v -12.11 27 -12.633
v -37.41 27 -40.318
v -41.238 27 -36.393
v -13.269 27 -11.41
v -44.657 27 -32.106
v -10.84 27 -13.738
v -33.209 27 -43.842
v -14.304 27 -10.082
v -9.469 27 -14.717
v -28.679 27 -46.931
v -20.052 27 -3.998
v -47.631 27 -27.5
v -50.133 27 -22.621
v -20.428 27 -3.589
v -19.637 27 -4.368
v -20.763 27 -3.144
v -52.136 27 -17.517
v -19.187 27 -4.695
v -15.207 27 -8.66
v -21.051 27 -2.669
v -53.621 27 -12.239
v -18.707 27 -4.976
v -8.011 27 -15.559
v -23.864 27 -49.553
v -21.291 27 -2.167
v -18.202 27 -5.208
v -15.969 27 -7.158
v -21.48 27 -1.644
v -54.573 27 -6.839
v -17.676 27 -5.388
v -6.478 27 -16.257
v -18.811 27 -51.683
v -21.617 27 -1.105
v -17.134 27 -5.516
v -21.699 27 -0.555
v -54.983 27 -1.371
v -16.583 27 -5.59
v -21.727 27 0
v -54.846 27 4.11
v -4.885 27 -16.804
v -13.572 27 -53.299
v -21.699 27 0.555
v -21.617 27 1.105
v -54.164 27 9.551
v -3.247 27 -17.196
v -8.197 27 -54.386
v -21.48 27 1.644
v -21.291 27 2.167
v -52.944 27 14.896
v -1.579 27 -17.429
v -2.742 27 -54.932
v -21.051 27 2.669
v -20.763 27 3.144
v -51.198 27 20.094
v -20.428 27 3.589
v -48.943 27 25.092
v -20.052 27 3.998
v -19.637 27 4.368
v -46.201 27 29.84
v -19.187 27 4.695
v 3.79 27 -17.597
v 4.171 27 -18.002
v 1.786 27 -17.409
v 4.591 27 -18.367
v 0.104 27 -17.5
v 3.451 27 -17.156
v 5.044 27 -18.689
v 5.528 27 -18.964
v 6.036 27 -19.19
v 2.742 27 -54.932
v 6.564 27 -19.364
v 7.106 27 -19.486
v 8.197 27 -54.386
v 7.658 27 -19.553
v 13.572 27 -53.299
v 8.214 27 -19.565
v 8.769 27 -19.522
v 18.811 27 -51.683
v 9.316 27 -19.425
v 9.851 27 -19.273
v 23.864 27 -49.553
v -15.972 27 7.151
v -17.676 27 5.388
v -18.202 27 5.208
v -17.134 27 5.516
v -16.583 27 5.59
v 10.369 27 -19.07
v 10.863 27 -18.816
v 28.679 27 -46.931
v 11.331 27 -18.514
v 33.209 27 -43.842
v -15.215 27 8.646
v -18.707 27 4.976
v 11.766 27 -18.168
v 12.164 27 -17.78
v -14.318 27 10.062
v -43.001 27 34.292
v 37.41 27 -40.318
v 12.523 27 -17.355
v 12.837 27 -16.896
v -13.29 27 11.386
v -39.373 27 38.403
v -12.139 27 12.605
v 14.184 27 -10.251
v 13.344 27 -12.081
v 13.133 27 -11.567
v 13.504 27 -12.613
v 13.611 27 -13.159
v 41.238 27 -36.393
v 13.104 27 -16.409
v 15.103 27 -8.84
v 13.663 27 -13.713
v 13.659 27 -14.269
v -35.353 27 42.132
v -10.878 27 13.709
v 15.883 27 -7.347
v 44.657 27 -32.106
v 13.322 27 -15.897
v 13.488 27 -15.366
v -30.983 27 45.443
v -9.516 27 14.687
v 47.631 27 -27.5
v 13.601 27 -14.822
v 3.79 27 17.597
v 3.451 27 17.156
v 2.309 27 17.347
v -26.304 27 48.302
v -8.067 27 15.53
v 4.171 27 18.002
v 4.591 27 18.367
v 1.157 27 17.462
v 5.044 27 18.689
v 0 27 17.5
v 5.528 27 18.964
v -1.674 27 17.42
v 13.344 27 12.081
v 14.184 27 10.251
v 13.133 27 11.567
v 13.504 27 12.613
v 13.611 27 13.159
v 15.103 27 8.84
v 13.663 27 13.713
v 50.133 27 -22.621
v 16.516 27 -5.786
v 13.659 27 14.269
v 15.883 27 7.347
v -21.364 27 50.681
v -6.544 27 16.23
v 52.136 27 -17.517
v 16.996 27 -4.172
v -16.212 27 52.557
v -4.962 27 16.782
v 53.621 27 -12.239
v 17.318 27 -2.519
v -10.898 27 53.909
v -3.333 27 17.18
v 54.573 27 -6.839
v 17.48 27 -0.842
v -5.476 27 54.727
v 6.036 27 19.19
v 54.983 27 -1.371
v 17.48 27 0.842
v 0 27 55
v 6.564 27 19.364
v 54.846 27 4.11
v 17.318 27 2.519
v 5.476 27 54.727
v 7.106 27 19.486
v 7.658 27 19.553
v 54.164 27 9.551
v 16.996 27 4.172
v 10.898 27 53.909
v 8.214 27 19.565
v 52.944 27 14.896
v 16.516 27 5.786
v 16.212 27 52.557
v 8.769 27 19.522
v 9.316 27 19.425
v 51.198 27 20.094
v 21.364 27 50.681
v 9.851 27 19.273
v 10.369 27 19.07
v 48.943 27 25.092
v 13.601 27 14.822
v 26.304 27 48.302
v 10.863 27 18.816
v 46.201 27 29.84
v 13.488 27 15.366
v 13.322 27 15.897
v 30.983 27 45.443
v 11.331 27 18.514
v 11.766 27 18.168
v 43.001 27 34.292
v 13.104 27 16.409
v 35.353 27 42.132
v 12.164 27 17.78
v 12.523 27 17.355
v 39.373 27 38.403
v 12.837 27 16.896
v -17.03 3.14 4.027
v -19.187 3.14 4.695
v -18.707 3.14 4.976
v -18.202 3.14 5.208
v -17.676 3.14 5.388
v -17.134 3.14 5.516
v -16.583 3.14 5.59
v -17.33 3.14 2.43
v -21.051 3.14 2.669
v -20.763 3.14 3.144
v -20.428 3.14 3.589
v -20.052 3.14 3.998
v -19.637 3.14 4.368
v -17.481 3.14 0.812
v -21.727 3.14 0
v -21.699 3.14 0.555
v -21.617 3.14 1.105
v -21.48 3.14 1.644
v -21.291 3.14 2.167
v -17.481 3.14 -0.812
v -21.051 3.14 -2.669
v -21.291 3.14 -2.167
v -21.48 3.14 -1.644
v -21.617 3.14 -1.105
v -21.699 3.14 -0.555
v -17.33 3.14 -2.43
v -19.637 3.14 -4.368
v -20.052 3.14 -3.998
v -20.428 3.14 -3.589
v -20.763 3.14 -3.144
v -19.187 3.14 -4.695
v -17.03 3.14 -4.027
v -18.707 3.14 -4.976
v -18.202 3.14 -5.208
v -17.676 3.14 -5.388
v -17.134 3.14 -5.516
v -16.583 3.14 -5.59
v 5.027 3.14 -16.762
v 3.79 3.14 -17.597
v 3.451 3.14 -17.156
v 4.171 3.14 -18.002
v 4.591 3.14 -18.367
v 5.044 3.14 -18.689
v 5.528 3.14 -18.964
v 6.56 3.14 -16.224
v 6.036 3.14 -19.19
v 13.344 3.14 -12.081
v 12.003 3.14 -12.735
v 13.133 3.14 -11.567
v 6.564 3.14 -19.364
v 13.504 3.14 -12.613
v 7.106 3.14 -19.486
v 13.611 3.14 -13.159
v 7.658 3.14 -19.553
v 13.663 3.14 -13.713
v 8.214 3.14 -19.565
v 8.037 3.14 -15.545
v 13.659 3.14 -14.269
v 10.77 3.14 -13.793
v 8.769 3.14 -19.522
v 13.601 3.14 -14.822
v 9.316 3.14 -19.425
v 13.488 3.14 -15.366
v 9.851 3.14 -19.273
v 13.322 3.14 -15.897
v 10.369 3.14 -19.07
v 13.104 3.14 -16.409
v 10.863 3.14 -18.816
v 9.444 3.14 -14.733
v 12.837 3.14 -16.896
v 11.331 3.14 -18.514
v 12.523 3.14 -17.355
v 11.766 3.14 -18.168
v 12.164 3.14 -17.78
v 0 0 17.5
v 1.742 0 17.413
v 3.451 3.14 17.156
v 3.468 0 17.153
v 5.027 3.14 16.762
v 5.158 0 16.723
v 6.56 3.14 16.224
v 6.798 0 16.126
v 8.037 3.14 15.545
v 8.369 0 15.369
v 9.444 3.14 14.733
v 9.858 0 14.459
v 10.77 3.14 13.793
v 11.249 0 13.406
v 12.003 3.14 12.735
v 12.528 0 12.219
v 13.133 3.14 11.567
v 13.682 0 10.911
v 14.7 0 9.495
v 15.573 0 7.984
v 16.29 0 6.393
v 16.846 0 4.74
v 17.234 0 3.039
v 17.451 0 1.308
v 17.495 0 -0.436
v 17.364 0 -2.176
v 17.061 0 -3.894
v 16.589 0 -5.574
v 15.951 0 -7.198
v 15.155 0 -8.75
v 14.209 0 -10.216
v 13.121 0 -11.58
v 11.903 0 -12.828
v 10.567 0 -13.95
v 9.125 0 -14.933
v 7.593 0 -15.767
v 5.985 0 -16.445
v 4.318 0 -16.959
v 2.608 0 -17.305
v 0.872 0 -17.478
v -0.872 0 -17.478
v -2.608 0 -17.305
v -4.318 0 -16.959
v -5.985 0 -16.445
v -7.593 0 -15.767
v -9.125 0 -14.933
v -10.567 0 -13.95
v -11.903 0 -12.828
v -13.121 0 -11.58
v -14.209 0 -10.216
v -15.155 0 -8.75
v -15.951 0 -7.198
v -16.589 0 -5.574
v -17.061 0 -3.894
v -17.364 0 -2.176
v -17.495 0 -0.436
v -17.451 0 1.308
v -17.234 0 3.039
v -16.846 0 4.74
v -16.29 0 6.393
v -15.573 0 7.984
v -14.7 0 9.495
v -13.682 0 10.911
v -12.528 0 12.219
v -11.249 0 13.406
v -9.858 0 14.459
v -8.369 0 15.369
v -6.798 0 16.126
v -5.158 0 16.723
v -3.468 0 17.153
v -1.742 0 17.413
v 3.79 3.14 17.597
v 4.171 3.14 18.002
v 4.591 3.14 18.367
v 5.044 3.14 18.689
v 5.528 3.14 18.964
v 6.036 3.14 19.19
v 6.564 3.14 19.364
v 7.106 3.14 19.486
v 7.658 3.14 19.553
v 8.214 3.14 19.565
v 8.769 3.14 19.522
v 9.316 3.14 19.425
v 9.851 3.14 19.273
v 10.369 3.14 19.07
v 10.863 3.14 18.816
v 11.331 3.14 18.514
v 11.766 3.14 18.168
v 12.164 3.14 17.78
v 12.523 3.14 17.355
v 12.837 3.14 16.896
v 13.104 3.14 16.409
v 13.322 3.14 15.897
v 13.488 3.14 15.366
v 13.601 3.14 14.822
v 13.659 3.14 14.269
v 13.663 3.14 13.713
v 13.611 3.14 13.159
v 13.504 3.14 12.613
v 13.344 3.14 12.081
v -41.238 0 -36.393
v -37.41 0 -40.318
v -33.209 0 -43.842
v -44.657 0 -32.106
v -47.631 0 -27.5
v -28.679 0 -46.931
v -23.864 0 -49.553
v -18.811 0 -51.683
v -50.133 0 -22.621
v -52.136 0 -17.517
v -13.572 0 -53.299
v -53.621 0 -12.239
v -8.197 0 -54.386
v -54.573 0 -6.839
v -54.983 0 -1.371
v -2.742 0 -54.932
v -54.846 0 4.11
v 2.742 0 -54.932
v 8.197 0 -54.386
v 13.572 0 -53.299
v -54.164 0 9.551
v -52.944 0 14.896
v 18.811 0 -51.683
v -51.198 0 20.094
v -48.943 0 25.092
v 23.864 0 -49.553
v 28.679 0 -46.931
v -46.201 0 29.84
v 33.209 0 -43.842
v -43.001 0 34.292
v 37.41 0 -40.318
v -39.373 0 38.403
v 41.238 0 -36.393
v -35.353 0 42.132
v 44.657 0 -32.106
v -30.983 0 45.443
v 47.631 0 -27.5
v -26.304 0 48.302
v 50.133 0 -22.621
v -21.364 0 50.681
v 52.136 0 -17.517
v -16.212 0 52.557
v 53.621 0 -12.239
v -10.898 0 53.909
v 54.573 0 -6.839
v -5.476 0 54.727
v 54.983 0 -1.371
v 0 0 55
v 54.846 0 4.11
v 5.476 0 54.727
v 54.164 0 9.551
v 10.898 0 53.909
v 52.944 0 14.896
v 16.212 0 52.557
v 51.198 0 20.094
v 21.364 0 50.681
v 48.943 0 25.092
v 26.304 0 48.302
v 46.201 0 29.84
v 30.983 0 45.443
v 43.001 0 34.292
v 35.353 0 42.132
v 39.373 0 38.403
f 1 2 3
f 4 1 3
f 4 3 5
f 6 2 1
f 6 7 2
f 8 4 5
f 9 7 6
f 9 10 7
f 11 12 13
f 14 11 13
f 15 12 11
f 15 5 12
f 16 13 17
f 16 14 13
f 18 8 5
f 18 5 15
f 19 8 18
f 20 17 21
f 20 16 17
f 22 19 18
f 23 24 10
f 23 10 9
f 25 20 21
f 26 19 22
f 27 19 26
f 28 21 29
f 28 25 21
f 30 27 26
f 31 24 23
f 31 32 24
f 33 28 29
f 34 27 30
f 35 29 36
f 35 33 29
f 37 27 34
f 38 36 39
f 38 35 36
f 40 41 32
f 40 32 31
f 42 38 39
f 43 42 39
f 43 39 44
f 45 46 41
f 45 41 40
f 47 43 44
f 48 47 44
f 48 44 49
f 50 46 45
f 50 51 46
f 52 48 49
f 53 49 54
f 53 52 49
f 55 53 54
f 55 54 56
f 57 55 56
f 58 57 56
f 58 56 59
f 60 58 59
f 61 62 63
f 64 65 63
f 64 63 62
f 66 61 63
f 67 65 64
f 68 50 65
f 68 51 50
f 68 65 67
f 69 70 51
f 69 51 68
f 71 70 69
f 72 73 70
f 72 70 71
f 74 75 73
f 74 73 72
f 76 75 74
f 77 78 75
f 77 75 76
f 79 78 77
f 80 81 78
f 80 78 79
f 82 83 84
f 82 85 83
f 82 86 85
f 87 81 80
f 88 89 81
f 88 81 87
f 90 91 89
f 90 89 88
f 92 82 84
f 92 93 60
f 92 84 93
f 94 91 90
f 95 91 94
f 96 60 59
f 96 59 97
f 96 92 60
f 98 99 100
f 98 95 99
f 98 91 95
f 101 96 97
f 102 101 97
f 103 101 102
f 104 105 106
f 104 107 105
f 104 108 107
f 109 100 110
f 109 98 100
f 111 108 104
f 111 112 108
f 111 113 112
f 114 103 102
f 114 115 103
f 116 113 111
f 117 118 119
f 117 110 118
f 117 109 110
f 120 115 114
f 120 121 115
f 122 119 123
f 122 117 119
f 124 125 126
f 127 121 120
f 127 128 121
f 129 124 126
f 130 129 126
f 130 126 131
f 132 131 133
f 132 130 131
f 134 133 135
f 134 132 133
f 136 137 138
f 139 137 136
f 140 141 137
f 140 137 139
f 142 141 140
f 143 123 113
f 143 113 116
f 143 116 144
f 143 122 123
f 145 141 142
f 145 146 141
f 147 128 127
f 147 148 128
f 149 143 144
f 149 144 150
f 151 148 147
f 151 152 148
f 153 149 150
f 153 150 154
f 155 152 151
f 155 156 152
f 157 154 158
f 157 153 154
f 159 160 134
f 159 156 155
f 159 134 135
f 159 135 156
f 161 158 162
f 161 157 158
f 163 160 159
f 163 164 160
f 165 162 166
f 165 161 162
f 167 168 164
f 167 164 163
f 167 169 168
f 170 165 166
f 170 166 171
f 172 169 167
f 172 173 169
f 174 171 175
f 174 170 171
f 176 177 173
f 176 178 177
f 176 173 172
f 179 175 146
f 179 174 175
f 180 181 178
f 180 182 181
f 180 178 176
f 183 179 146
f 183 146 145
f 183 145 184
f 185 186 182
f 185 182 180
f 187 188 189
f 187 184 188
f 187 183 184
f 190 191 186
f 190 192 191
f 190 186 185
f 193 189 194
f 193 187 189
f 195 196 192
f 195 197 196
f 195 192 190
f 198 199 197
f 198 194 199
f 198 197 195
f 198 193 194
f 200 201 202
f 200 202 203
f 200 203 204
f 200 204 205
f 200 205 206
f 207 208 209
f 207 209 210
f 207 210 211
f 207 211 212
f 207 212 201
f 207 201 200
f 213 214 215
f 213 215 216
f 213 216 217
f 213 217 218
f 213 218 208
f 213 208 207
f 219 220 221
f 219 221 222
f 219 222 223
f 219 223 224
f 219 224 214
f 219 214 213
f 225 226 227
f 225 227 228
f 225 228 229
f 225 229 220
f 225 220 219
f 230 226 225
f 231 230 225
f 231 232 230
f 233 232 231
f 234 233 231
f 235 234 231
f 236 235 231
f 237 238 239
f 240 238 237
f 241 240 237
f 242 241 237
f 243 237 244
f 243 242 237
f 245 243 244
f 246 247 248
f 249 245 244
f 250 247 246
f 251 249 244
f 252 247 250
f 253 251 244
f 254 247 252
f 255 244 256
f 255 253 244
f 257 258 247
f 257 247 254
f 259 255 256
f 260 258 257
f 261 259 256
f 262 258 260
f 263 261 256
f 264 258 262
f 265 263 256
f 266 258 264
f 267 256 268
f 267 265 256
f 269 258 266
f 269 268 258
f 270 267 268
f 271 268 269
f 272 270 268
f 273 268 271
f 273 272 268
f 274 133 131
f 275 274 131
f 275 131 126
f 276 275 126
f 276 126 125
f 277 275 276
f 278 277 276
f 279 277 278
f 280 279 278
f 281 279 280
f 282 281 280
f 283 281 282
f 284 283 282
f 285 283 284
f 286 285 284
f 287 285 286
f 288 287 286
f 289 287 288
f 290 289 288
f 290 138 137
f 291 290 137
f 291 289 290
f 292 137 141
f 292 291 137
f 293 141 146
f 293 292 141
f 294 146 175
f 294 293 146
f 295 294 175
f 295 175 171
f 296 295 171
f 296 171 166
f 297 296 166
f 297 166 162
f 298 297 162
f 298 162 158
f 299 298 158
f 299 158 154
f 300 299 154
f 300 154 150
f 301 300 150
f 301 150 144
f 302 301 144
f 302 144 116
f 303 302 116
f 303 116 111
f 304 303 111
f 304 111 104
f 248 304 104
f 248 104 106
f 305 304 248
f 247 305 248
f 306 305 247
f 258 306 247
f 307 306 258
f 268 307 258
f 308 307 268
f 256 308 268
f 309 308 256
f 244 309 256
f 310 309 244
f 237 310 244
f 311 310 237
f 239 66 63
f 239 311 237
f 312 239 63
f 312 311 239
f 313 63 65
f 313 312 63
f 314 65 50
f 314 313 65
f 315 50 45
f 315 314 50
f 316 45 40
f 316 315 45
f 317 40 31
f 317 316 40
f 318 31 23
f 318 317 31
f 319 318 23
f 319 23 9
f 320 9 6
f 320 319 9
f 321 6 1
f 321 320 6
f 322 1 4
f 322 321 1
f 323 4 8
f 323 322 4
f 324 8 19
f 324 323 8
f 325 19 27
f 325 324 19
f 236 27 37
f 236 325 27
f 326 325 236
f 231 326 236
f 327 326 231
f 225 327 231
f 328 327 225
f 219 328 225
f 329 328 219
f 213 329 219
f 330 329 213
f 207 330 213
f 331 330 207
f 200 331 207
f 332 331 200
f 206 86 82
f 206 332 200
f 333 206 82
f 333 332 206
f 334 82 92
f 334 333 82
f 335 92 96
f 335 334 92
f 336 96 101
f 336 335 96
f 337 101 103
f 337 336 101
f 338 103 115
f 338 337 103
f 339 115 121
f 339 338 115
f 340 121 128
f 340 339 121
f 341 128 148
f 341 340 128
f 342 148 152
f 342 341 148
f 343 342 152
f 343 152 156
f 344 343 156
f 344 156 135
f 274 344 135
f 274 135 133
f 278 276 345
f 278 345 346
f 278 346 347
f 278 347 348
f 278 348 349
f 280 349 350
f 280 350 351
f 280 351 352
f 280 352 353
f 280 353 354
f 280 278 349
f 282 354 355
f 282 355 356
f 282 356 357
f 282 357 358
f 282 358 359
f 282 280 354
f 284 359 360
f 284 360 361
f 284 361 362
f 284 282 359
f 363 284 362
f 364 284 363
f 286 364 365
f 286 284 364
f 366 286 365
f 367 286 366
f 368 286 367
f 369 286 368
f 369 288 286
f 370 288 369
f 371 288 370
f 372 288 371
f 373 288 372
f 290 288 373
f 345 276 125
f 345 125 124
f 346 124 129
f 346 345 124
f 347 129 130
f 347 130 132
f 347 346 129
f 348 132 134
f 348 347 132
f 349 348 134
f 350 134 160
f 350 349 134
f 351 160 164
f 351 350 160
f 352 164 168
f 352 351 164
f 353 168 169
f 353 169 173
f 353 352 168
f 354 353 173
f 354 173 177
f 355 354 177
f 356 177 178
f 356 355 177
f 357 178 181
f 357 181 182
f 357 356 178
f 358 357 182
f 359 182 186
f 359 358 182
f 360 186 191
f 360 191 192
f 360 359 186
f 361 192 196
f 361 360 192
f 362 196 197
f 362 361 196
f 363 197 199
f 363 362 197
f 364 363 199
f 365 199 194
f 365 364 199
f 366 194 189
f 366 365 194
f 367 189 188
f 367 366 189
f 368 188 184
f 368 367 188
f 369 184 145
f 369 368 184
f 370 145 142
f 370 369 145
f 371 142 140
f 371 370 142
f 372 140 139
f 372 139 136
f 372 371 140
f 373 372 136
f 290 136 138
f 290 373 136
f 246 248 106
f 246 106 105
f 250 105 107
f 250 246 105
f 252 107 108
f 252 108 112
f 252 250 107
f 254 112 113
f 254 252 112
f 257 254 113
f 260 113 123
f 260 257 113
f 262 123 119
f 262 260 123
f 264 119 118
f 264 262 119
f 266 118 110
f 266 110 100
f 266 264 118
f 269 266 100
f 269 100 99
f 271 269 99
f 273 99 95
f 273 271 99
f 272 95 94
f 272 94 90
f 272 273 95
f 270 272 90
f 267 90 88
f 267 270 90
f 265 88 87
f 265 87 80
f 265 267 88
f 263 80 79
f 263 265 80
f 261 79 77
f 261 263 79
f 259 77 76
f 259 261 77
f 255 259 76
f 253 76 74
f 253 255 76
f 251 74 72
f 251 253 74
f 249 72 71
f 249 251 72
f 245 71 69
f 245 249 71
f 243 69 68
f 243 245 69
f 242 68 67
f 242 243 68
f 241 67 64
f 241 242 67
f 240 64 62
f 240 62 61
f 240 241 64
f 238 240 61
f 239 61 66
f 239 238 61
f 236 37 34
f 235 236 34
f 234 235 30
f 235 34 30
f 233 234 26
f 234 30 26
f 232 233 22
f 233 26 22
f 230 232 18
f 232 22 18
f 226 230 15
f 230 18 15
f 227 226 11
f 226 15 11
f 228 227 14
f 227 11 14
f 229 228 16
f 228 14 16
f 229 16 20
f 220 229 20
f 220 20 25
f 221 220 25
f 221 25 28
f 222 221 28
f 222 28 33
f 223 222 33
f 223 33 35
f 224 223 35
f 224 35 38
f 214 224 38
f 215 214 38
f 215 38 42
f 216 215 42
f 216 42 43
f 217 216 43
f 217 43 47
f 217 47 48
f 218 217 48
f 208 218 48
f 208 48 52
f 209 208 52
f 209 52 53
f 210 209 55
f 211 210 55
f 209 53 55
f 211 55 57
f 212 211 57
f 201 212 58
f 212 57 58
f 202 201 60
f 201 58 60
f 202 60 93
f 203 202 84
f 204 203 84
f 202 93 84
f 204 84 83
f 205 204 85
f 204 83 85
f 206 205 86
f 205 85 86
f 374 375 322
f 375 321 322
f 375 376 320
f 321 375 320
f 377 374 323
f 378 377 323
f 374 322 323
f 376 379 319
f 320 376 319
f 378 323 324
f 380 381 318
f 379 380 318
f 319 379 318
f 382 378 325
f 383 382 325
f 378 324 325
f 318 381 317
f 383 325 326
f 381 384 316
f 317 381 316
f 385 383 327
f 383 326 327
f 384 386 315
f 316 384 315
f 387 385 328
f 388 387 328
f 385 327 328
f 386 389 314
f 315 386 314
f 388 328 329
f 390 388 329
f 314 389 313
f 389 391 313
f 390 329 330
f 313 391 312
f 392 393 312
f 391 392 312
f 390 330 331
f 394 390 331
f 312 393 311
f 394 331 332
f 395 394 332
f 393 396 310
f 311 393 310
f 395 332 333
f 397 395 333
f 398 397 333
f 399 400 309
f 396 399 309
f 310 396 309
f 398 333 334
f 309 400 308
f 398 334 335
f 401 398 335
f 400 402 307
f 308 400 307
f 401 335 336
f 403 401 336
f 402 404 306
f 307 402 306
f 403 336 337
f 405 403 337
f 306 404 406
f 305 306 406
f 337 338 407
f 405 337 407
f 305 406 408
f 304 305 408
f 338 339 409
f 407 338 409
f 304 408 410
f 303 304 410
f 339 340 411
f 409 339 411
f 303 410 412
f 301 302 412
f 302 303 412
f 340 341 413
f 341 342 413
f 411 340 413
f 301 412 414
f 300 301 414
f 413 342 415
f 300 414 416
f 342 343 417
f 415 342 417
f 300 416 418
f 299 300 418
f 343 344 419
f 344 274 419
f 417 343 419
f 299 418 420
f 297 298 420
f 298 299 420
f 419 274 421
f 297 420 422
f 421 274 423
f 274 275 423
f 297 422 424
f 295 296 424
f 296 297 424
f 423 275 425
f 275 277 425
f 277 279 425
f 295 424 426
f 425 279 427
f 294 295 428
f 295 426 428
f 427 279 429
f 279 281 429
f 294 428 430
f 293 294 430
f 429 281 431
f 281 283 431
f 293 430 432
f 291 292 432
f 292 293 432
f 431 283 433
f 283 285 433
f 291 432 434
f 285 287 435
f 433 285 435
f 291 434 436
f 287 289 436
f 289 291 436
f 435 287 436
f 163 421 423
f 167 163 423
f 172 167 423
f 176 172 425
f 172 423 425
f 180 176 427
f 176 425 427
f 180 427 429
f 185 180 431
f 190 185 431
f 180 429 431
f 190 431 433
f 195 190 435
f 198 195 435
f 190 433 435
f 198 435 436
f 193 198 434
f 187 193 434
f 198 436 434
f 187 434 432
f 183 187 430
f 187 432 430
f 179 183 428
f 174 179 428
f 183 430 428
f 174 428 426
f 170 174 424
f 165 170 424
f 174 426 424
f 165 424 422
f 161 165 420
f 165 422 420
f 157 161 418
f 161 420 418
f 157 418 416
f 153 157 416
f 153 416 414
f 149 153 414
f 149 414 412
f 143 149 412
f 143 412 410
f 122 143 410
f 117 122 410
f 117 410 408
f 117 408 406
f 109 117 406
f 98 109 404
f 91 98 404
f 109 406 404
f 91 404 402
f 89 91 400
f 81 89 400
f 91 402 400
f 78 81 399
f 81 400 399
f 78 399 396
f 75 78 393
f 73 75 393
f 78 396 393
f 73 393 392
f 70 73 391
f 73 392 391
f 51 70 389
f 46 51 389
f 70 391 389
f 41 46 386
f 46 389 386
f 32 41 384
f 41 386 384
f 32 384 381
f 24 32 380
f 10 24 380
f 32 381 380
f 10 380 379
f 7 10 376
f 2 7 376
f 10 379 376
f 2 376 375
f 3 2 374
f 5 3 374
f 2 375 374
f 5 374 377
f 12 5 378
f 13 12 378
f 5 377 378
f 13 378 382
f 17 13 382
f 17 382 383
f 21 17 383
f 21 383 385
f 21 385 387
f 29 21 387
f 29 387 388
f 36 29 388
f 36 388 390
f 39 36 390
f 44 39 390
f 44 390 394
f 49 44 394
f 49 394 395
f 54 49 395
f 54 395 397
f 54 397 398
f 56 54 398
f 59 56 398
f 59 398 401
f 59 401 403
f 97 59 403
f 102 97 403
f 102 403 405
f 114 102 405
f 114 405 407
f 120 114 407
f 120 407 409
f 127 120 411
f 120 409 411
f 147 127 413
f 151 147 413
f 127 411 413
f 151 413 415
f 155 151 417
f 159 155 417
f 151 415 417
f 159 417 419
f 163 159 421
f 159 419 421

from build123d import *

# Parameters (mm, degrees)
SKETCH1_R           = 55
BOSS_EXTRUDE1_DEPTH = 27
SKETCH2_R           = 17.5
CUT_EXTRUDE1_DEPTH  = 83.33468285
SKETCH3_R           = 5.609144045
CUT_EXTRUDE2_DEPTH  = 23.86019443
CIRPATTERN1_COUNT   = 3


with BuildPart() as part:
    # Sketch1 → Boss-Extrude1 (new body)
    with BuildSketch(Plane(origin=(0, 0, 0), x_dir=(1, 0, 0), z_dir=(0, 1, 0))):
        Circle(SKETCH1_R)
    extrude(amount=BOSS_EXTRUDE1_DEPTH)

    # Sketch2 → Cut-Extrude1 (cut, through all)
    with BuildSketch(Plane(origin=(0, 0, 0), x_dir=(1, 0, 0), z_dir=(0, 1, 0))):
        Circle(SKETCH2_R)
    extrude(amount=CUT_EXTRUDE1_DEPTH, mode=Mode.SUBTRACT)

    # Sketch3 → Cut-Extrude2 (cut)
    with BuildSketch(Plane(origin=(0, 27, 0), x_dir=(1, 0, 0), z_dir=(0, 1, 0))):
        with Locations((-16.117619445, 0)):
            Circle(SKETCH3_R)
    cut_extrude2 = extrude(amount=-CUT_EXTRUDE2_DEPTH, mode=Mode.SUBTRACT)

    # CirPattern1: Cut-Extrude2 ×3 about axis
    cirpattern1_axis = Axis((0, 0, 0), (0, 1, 0))
    for i in range(1, CIRPATTERN1_COUNT):
        add(cut_extrude2.rotate(cirpattern1_axis, i * 360 / CIRPATTERN1_COUNT), mode=Mode.SUBTRACT)


solid = part.part
